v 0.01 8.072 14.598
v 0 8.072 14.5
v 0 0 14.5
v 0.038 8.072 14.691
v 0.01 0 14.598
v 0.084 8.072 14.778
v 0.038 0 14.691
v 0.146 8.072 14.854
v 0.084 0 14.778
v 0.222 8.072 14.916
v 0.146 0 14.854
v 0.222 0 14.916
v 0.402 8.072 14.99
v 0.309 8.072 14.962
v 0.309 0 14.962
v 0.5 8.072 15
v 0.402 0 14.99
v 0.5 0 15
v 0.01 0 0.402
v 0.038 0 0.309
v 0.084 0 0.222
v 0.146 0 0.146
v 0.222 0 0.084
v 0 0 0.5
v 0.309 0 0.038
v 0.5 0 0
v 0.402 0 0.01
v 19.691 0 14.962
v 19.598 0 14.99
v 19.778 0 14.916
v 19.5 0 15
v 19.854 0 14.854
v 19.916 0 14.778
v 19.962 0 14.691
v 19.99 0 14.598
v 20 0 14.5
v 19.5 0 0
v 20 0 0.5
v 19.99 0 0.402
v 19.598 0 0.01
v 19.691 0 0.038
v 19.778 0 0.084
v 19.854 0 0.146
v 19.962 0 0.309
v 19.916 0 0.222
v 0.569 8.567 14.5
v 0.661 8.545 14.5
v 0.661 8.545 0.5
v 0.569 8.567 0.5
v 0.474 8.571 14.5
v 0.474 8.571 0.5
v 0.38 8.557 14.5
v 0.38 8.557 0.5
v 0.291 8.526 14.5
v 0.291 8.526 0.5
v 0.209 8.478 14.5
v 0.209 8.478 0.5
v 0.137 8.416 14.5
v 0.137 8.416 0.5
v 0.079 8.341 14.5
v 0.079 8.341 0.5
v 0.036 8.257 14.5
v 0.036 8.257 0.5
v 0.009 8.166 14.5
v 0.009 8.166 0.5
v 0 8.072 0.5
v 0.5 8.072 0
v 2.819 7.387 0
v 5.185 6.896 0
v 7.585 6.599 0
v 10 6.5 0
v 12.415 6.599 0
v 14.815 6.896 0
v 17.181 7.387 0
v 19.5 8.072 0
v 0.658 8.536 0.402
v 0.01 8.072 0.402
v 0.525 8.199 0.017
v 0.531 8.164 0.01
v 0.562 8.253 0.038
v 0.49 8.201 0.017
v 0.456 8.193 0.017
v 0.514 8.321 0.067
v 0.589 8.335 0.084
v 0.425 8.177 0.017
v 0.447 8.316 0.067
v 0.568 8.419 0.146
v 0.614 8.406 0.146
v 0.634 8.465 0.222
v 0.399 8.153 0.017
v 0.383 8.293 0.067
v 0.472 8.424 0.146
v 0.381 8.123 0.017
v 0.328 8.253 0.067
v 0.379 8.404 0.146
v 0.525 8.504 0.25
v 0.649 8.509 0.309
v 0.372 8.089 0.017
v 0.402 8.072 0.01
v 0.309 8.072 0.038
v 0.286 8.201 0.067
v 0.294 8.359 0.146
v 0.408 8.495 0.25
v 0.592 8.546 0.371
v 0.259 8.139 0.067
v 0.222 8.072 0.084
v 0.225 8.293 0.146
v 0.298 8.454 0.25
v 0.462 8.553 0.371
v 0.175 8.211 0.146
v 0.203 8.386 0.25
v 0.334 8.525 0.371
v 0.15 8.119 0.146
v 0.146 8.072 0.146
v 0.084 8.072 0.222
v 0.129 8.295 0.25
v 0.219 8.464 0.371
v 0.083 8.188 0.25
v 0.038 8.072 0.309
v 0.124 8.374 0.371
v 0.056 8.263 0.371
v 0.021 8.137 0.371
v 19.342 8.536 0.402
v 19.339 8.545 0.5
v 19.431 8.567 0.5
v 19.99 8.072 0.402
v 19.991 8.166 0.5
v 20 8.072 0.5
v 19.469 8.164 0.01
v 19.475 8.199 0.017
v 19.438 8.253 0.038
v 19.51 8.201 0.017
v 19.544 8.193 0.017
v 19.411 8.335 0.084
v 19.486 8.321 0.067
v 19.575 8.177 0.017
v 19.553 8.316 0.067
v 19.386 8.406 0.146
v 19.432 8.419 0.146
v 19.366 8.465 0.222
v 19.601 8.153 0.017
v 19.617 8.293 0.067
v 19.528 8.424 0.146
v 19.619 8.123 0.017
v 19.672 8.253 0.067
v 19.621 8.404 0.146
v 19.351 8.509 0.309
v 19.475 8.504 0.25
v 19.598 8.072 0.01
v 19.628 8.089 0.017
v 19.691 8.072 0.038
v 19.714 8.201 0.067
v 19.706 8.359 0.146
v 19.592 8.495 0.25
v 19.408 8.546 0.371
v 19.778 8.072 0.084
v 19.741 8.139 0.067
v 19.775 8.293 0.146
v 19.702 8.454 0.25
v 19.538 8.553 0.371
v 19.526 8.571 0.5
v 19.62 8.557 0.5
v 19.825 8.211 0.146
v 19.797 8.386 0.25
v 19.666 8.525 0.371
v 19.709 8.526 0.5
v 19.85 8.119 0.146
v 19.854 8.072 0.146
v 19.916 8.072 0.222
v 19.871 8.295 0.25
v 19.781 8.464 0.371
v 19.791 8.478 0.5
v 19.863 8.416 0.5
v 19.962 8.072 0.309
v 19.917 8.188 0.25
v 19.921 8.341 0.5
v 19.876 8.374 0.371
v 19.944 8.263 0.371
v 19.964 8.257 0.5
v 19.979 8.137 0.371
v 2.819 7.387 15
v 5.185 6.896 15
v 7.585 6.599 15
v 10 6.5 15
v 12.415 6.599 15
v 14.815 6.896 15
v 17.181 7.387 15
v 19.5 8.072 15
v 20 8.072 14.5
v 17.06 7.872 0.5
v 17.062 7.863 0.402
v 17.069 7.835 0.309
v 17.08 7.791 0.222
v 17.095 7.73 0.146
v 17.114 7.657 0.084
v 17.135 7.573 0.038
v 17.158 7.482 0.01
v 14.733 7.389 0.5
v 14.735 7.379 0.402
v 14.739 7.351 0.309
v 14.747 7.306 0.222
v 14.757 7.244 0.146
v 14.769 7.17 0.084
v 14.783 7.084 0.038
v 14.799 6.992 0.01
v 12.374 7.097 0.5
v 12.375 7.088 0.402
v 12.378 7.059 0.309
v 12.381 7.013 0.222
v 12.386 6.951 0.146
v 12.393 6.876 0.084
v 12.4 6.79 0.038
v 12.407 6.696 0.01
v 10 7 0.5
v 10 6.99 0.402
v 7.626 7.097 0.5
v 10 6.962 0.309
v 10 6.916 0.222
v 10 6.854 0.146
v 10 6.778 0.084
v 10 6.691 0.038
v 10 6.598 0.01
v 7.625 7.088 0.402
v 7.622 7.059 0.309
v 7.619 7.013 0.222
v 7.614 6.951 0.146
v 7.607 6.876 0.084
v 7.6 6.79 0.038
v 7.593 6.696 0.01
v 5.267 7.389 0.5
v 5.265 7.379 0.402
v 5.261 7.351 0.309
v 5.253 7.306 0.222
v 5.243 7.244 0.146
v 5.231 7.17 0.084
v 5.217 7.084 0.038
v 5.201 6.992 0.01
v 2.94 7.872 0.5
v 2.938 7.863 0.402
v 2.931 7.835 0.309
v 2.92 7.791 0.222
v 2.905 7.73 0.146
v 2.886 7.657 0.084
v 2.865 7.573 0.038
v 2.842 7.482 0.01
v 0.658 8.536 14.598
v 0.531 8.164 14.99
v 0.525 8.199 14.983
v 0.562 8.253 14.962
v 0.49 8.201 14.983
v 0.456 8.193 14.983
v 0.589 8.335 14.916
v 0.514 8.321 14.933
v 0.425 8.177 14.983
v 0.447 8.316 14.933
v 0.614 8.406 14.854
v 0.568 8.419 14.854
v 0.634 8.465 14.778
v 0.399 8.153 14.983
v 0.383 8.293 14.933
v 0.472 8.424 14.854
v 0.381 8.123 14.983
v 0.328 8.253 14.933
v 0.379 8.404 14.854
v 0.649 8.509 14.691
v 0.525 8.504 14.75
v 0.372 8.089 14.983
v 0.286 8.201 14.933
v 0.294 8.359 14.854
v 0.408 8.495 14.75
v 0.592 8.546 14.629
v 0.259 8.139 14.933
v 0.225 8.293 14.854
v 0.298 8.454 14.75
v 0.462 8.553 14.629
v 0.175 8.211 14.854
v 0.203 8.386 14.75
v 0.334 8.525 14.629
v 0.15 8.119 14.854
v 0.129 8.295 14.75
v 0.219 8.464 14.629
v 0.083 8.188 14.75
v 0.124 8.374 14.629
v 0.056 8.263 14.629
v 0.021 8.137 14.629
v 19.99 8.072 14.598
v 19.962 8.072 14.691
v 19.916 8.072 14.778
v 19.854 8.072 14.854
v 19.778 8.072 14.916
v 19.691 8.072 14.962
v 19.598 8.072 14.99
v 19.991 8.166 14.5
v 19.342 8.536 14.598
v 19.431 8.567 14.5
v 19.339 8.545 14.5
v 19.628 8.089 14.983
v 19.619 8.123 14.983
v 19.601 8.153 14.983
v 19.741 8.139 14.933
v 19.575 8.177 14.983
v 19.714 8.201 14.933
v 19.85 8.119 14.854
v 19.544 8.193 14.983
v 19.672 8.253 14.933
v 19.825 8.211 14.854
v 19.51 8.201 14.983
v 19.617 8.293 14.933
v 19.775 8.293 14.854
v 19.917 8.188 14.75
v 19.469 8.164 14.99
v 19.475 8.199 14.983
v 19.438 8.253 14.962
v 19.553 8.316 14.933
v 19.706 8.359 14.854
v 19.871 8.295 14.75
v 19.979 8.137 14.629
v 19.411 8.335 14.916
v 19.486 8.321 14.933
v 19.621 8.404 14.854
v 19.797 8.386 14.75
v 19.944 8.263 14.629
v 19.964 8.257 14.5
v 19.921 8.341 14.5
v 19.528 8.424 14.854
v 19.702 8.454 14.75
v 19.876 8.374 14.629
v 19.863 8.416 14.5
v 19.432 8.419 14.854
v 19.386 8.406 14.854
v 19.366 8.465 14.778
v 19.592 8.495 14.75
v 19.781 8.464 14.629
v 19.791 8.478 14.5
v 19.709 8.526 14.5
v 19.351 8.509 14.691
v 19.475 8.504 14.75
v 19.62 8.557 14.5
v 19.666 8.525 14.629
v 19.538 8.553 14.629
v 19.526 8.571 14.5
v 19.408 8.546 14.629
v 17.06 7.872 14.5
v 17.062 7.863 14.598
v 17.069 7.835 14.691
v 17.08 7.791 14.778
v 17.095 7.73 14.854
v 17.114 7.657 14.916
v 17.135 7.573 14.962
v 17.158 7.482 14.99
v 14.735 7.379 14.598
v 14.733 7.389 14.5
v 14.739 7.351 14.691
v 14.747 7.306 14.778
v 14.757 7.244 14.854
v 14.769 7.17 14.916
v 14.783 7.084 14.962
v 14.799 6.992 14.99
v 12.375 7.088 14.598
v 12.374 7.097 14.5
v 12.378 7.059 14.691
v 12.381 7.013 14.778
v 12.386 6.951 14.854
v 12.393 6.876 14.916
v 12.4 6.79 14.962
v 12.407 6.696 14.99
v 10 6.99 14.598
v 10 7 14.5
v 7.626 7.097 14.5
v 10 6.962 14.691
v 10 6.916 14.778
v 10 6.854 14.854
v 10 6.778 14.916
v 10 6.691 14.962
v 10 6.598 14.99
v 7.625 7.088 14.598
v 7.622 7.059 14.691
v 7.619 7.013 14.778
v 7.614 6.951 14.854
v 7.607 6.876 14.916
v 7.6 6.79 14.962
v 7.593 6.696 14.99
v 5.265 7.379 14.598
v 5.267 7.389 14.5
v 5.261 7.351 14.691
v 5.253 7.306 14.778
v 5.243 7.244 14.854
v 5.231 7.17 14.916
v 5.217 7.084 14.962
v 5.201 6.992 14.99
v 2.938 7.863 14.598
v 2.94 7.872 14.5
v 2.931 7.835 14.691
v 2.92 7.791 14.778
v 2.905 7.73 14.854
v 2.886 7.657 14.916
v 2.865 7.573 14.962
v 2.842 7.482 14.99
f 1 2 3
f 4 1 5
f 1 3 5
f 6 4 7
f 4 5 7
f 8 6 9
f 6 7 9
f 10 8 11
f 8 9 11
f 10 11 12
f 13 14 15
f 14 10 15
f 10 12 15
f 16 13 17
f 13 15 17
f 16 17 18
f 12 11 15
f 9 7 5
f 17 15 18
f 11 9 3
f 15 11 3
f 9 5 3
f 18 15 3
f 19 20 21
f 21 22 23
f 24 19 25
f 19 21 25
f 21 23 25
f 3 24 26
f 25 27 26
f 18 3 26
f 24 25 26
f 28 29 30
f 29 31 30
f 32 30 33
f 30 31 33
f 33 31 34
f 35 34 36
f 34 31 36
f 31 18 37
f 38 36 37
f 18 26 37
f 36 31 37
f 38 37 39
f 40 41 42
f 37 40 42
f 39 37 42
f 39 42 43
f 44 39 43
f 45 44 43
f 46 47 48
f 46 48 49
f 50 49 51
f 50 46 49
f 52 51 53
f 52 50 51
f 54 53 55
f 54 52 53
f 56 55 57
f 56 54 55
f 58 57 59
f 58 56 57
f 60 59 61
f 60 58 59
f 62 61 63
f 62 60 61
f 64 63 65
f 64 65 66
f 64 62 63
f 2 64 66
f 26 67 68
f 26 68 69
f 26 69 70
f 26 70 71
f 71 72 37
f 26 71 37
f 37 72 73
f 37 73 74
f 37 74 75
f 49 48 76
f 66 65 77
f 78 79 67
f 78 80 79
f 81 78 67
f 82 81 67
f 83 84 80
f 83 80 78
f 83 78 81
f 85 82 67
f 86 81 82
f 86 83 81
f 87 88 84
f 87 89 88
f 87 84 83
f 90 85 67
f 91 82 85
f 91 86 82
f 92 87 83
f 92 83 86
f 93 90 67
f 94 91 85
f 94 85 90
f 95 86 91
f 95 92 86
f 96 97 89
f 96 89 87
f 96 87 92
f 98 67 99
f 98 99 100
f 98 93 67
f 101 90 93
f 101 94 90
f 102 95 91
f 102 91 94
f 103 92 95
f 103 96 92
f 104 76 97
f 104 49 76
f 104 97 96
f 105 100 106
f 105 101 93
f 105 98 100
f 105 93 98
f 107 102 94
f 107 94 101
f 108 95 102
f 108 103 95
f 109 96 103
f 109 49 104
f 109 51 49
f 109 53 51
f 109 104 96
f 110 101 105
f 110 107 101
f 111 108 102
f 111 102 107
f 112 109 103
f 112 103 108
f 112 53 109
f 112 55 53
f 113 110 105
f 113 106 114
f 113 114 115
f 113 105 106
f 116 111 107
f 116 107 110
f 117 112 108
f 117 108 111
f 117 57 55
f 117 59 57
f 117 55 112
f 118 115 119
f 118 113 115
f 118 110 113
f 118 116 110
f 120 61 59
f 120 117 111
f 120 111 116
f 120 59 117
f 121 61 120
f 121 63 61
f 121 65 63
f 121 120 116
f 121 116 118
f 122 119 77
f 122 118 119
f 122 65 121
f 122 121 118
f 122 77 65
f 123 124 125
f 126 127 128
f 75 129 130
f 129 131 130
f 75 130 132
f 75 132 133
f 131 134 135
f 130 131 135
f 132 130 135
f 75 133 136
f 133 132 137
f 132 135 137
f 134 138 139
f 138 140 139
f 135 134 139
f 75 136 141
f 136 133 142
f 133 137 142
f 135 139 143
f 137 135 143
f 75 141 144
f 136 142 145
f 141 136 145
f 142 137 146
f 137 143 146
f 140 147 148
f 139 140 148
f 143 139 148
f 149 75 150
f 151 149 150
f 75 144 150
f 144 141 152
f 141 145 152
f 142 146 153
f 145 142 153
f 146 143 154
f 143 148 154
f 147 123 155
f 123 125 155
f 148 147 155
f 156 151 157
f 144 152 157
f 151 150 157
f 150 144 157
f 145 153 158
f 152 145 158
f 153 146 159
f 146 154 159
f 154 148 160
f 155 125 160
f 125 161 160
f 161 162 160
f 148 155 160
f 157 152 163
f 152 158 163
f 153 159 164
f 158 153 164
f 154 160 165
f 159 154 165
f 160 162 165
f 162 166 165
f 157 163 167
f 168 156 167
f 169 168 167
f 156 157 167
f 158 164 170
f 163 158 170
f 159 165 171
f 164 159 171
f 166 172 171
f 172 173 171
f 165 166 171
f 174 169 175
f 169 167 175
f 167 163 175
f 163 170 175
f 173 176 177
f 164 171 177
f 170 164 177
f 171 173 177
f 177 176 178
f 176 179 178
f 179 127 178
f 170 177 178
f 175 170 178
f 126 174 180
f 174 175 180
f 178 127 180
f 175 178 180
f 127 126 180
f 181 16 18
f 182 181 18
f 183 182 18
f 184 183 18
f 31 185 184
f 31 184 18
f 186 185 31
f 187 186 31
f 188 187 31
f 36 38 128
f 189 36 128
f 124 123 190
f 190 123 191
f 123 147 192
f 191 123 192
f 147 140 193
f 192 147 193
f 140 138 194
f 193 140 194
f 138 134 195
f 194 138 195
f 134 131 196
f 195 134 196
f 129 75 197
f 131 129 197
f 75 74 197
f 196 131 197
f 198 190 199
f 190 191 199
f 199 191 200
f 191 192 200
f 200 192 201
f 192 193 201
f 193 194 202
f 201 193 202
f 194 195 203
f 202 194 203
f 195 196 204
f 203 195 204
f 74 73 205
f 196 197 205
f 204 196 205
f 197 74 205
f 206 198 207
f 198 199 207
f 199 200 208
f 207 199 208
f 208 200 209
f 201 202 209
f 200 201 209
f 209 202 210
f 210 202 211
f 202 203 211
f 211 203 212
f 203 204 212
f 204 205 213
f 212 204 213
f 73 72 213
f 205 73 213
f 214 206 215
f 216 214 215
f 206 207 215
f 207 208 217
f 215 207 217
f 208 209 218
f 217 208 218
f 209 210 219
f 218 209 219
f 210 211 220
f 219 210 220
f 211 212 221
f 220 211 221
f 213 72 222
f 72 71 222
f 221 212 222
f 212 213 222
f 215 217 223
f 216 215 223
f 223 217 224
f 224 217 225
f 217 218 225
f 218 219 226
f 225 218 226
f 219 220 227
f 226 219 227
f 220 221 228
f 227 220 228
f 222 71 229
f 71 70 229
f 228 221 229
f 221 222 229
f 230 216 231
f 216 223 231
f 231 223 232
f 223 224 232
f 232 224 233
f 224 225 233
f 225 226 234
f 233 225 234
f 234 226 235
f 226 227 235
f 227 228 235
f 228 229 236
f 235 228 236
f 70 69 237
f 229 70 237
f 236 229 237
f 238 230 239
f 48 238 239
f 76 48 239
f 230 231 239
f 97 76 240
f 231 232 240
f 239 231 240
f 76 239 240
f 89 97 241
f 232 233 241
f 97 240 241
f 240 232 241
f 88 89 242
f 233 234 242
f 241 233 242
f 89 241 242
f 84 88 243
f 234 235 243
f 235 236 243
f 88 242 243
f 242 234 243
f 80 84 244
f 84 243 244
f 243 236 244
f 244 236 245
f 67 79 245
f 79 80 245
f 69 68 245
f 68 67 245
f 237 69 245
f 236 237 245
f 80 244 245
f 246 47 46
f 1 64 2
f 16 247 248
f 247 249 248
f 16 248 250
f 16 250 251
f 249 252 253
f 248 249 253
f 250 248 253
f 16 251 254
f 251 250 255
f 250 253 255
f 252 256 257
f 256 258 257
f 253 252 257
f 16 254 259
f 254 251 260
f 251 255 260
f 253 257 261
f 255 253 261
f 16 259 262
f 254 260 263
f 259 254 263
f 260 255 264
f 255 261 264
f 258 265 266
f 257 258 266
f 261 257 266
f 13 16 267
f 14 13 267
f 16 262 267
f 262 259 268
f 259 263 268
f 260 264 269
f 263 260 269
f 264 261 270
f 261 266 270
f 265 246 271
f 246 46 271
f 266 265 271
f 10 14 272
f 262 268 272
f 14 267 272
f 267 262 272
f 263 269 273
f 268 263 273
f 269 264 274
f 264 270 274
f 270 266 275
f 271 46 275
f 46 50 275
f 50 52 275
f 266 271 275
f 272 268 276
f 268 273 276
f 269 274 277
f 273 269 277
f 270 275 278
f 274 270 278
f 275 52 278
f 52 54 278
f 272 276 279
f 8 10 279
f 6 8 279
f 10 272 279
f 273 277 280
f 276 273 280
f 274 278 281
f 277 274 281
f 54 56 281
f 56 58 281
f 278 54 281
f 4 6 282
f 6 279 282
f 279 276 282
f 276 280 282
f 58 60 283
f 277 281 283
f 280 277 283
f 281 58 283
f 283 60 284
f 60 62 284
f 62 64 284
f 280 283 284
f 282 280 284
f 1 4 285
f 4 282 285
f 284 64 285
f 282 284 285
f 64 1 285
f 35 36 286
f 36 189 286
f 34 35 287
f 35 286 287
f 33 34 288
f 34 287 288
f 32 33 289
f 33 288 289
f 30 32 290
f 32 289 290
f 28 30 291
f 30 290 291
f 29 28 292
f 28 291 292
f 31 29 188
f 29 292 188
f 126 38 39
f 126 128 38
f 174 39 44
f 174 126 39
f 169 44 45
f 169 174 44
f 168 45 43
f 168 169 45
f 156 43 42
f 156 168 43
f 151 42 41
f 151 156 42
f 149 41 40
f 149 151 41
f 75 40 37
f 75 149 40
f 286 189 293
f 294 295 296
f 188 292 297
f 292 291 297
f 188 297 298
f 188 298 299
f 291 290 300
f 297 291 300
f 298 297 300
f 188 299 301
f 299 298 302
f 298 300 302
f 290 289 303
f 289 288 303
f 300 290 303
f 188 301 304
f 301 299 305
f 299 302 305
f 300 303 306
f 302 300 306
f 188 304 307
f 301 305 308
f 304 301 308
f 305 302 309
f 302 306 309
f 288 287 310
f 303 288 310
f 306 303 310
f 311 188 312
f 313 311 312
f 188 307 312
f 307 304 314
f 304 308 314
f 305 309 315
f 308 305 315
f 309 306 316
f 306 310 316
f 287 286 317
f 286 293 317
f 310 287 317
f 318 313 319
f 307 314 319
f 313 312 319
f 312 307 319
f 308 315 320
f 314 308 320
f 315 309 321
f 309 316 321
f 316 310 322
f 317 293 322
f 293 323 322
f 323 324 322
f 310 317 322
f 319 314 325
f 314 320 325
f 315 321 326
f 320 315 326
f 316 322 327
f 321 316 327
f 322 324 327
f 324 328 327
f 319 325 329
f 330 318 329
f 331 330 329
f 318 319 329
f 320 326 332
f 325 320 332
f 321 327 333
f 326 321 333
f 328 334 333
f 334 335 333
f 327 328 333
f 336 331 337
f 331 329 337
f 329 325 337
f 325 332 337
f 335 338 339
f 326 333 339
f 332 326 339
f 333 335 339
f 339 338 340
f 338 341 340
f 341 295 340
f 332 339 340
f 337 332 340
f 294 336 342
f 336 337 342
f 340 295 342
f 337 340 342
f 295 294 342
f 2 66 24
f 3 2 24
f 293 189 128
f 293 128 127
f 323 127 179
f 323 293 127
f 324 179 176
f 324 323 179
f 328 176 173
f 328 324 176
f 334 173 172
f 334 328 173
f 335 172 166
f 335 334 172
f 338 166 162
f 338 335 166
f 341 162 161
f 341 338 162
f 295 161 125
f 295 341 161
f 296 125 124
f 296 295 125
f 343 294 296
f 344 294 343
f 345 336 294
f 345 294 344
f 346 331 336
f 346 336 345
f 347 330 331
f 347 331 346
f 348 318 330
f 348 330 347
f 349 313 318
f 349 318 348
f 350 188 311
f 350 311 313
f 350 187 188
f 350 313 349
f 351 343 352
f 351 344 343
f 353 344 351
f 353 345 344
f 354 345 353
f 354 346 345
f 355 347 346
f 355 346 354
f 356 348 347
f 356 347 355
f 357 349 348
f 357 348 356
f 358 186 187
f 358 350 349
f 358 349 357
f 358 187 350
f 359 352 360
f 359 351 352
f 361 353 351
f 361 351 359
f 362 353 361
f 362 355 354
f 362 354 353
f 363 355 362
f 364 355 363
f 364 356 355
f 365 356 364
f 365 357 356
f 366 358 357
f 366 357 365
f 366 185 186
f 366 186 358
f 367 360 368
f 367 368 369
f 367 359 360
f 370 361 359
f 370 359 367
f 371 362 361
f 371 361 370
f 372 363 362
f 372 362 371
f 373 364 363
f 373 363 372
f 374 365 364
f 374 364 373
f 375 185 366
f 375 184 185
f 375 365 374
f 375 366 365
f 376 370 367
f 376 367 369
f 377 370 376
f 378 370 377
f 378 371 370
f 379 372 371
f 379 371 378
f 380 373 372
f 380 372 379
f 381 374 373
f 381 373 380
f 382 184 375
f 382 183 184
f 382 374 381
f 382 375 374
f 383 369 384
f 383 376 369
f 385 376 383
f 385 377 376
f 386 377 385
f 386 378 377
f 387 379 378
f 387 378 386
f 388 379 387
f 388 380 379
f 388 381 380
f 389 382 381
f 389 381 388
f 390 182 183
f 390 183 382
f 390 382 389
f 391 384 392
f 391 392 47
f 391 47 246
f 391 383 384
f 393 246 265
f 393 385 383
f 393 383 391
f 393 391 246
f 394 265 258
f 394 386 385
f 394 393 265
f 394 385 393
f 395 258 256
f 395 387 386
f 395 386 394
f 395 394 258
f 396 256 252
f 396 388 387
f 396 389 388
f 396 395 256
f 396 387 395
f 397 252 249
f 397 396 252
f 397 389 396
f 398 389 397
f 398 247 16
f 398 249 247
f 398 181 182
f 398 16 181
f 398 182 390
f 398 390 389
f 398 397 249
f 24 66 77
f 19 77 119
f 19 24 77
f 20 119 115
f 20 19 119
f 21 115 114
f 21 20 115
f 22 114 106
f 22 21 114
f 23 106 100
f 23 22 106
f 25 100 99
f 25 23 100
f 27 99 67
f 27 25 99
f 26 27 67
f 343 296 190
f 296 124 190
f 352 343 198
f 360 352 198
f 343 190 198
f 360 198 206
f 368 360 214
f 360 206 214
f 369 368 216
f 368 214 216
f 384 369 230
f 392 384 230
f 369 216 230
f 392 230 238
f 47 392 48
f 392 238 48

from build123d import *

# Parameters (mm, degrees)
BOSS_EXTRUDE1_DEPTH = 15
FILLET1_R           = 0.5


with BuildPart() as part:
    # Sketch1 → Boss-Extrude1 (new body)
    with BuildSketch(Plane.XY):
        with BuildLine():
            Line((0, 0), (20, 0))
            Line((20, 0), (20, 8.778684822))
            ThreePointArc((20, 8.778684822), (10, 7), (0, 8.778684822))
            Line((0, 8.778684822), (0, 0))
        make_face()
    extrude(amount=BOSS_EXTRUDE1_DEPTH)

    # Fillet1
    fillet1_edges = [part.edges().sort_by_distance(p)[0] for p in [
        (20, 4.389342411, 15),
        (10, 7, 15),
        (0, 4.389342411, 15),
        (10, 7, 0),
        (20, 4.389342411, 0),
        (0, 4.389342411, 0),
        (0, 8.778684822, 7.5),
        (20, 8.778684822, 7.5),
    ]]
    fillet(fillet1_edges, radius=FILLET1_R)


solid = part.part
